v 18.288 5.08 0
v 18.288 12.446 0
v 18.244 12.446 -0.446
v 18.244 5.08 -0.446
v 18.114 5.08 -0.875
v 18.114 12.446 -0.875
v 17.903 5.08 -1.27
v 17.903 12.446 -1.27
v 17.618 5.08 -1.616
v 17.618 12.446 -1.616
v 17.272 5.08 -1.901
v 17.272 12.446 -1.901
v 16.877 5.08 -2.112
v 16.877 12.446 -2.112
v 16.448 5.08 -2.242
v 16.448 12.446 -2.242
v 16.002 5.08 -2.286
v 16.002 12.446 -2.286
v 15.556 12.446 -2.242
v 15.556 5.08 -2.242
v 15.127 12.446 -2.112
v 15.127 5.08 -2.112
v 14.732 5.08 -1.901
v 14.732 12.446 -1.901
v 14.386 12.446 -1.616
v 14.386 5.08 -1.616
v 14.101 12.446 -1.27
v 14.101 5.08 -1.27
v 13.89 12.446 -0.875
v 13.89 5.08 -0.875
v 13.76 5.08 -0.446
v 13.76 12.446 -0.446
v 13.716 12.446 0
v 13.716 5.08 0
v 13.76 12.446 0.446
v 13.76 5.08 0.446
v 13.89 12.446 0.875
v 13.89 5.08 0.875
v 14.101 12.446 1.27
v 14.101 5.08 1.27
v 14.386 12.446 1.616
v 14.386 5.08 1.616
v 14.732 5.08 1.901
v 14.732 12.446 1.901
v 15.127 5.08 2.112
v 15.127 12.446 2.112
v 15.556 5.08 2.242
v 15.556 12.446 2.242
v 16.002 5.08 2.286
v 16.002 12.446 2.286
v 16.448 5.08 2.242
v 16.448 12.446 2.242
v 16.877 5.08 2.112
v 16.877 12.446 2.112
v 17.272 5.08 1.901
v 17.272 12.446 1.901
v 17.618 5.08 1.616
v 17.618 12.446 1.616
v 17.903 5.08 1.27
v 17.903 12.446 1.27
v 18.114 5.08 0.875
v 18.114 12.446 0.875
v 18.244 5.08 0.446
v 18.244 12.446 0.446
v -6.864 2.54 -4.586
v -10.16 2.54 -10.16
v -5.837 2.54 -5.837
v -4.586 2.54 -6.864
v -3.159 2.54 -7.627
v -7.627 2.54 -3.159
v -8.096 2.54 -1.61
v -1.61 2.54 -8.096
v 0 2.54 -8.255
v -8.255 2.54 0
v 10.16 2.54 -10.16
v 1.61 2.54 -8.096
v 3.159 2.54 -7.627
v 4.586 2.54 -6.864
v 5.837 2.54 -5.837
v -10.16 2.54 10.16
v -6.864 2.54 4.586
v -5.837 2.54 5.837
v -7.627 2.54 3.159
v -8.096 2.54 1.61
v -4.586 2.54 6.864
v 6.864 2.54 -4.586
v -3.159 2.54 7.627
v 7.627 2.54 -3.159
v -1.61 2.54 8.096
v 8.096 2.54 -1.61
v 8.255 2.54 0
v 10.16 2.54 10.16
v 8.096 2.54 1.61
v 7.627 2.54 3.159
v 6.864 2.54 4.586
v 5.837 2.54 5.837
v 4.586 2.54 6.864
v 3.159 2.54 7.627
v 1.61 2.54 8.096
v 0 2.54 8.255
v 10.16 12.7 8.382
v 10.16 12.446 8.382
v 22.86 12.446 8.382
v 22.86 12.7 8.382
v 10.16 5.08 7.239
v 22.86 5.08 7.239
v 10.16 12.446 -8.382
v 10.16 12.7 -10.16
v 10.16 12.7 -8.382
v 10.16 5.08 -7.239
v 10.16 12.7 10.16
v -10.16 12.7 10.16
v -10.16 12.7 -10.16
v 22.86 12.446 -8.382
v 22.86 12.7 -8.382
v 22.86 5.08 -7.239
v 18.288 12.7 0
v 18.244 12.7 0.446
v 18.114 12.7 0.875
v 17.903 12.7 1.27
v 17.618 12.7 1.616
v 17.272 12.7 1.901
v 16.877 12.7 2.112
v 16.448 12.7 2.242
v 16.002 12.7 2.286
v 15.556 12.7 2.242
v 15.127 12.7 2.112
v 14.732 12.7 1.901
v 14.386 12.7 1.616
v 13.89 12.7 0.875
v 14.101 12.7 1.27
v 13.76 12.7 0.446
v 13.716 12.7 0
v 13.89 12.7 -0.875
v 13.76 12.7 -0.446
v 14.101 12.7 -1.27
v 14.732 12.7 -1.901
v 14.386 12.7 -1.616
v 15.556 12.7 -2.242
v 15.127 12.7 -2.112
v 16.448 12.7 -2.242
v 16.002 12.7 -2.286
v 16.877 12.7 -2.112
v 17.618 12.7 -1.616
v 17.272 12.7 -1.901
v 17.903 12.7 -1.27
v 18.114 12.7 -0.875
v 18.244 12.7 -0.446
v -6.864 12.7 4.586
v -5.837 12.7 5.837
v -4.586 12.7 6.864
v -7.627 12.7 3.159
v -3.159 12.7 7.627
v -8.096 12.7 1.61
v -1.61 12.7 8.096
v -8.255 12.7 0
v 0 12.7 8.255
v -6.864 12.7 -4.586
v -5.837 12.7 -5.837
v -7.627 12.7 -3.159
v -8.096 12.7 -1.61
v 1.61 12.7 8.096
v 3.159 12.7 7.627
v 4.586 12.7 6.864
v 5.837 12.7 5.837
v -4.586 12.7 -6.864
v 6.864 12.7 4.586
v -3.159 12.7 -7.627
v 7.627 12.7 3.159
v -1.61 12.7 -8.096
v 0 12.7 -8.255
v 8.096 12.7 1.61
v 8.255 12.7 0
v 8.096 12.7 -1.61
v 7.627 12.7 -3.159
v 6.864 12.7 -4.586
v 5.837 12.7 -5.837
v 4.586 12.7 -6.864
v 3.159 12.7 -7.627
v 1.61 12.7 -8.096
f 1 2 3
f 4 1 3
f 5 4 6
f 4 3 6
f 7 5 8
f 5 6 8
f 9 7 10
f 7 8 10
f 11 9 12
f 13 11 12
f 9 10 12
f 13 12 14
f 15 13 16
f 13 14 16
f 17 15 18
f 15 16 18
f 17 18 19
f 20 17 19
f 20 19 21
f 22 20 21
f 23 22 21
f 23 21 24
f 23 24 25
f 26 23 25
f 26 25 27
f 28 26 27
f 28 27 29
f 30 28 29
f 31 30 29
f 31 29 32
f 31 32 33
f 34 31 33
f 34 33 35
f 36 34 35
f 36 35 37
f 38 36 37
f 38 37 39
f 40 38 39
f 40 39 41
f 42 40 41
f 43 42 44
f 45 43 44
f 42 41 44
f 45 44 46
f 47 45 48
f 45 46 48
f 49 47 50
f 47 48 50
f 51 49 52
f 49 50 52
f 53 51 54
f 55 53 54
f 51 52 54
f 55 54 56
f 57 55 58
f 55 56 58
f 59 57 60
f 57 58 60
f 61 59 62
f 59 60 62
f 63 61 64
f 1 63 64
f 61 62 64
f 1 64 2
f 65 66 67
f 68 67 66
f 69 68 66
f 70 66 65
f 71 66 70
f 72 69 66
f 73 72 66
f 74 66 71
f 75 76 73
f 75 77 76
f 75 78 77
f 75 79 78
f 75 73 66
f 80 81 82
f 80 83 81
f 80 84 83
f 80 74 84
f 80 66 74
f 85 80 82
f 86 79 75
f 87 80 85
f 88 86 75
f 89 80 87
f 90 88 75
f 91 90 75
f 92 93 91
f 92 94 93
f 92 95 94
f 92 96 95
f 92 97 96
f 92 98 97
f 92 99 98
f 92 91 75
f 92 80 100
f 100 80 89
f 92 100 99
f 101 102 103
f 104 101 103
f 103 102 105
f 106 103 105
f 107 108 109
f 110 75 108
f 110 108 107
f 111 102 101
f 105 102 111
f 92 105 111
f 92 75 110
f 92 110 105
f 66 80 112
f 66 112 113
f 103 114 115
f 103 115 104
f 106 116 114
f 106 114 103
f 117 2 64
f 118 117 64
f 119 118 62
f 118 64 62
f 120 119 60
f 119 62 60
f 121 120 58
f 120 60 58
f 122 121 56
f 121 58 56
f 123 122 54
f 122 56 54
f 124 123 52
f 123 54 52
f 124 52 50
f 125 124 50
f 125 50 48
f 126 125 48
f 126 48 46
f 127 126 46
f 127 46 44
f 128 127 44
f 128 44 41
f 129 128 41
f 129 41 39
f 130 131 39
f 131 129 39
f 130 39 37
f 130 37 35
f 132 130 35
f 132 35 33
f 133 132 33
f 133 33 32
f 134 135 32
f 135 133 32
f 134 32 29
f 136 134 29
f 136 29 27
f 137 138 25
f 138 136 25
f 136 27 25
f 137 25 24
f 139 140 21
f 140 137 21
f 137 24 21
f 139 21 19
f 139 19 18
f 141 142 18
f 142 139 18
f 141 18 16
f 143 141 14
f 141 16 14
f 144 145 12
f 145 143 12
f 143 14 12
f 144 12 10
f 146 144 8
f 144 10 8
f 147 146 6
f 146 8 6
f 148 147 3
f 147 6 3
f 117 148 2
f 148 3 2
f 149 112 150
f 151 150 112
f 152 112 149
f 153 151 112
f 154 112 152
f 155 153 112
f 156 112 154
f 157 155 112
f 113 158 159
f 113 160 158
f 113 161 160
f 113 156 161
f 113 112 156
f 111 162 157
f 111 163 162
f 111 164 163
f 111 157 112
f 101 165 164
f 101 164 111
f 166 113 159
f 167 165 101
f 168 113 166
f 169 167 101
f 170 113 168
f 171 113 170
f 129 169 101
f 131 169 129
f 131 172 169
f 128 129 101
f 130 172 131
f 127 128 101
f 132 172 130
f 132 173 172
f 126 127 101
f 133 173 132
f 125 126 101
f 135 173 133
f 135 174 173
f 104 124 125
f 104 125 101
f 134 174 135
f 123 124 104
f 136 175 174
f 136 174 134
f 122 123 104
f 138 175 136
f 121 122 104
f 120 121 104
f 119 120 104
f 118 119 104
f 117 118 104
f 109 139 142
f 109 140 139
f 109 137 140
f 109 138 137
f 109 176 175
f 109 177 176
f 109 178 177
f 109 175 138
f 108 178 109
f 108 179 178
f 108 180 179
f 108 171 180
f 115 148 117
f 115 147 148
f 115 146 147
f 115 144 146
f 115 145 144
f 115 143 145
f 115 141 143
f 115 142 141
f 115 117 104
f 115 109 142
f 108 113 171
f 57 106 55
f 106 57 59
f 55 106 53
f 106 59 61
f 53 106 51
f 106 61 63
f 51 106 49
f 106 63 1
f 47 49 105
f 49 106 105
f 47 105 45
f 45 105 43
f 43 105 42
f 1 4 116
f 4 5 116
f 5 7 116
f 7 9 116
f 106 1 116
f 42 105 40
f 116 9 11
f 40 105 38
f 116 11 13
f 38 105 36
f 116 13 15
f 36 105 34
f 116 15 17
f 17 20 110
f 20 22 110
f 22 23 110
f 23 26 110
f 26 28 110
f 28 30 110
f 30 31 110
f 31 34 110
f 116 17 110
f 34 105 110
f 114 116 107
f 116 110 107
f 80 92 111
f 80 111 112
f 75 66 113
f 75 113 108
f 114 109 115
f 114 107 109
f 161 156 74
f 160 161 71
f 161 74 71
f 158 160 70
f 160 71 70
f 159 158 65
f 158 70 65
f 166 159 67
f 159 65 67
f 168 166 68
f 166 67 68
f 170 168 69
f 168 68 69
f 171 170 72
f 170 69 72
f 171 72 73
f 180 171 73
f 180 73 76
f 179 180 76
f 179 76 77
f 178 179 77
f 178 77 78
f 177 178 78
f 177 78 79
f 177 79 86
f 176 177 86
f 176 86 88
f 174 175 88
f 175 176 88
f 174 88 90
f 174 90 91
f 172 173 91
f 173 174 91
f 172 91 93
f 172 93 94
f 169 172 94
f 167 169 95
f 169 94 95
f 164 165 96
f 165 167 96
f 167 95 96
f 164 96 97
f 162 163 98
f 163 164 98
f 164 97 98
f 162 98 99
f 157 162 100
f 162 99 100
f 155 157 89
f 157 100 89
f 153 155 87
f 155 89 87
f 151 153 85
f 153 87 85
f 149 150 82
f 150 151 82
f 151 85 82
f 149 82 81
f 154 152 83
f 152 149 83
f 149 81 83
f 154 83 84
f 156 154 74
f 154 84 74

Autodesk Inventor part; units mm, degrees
ref_plane "YZ Plane" through (0, 0, 0) normal (1, 0, 0) x (0, 1, 0)
ref_plane "XZ Plane" through (0, 0, 0) normal (0, 1, 0) x (-1, 0, 0)
ref_plane "XY Plane" through (0, 0, 0) normal (0, 0, 1) x (1, 0, 0)
sketch "Sketch1" plane through (0, 0, 0) normal (0, 1, 0) x (-1, 0, 0)
  line L0 (-10.16, 10.16) -> (10.16, 10.16)
  line L1 (10.16, 10.16) -> (10.16, -10.16)
  line L2 (10.16, -10.16) -> (-10.16, -10.16)
  line L3 (-10.16, -10.16) -> (-10.16, 10.16)
  circle A0 centre (0, 0) radius 8.255
  dimension "d0" = 20.32
  dimension "d1" = 20.32
  dimension "d2" = 10.16
  dimension "d3" = 10.16
  dimension "d4" = 16.51
extrude "Extrusion1" add sketch "Sketch1" along normal blind 12.7
sketch "Sketch2" plane through (10.16, 0, 10.16) normal (1, 0, 0) x (0, 0, -1)
  line L0 (1.778, 12.446) -> (2.921, 5.08)
  line L1 (2.921, 5.08) -> (17.399, 5.08)
  line L2 (17.399, 5.08) -> (18.542, 12.446)
  line L3 (18.542, 12.446) -> (1.778, 12.446)
  line L4 (20.32, 0) -> (0, 0) projected
  line L5 (20.32, 0) -> (20.32, 12.7) projected
  point P0 (10.16, 0)
  dimension "d7" = 16.764
  dimension "d8" = 14.478
  dimension "d9" = 7.366
  dimension "d10" = 5.08
  dimension "d11" = 2.921
extrude "Extrusion2" add sketch "Sketch2" along normal blind 12.7
sketch "Sketch3" plane through (10.16, 12.446, 8.382) normal (0, 1, 0) x (1, 0, 0)
  circle A0 centre (5.842, 8.382) radius 2.286
  line L0 (12.7, 16.764) -> (12.7, 0) projected
  point P0 (-10.16, 8.382)
  dimension "d14" = 4.572
  dimension "d15" = 6.858
extrude "Extrusion3" cut sketch "Sketch3" against normal blind 17.78
sketch "Sketch4" plane through (10.16, 12.446, 8.382) normal (0, 1, 0) x (1, 0, 0)
  circle A0 centre (5.842, 8.382) radius 2.286 projected
  line L0 (0, 0) -> (0, 16.764) projected
  line L1 (0, 0) -> (12.7, 0) projected
  line L2 (12.7, 16.764) -> (12.7, 0) projected
  line L3 (0, 16.764) -> (12.7, 16.764) projected
  point P0 (-10.16, 8.382)
extrude "Extrusion4" add sketch "Sketch4" along normal up to surface (0.254 mm away)
sketch "Sketch5" plane through (0, 0, 0) normal (0, -1, 0) x (1, 0, 0)
  line L0 (14.2823, 20.4865) -> (-14.5737, 20.4865)
  line L1 (-14.5737, 20.4865) -> (-14.5737, -26.9822)
  line L2 (-14.5737, -26.9822) -> (14.2823, -26.9822)
  line L3 (14.2823, -26.9822) -> (14.2823, 20.4865)
  point P0 (0, 0)
extrude "Extrusion5" cut sketch "Sketch5" against normal blind 2.54
properties part number "HopperFinal3"
